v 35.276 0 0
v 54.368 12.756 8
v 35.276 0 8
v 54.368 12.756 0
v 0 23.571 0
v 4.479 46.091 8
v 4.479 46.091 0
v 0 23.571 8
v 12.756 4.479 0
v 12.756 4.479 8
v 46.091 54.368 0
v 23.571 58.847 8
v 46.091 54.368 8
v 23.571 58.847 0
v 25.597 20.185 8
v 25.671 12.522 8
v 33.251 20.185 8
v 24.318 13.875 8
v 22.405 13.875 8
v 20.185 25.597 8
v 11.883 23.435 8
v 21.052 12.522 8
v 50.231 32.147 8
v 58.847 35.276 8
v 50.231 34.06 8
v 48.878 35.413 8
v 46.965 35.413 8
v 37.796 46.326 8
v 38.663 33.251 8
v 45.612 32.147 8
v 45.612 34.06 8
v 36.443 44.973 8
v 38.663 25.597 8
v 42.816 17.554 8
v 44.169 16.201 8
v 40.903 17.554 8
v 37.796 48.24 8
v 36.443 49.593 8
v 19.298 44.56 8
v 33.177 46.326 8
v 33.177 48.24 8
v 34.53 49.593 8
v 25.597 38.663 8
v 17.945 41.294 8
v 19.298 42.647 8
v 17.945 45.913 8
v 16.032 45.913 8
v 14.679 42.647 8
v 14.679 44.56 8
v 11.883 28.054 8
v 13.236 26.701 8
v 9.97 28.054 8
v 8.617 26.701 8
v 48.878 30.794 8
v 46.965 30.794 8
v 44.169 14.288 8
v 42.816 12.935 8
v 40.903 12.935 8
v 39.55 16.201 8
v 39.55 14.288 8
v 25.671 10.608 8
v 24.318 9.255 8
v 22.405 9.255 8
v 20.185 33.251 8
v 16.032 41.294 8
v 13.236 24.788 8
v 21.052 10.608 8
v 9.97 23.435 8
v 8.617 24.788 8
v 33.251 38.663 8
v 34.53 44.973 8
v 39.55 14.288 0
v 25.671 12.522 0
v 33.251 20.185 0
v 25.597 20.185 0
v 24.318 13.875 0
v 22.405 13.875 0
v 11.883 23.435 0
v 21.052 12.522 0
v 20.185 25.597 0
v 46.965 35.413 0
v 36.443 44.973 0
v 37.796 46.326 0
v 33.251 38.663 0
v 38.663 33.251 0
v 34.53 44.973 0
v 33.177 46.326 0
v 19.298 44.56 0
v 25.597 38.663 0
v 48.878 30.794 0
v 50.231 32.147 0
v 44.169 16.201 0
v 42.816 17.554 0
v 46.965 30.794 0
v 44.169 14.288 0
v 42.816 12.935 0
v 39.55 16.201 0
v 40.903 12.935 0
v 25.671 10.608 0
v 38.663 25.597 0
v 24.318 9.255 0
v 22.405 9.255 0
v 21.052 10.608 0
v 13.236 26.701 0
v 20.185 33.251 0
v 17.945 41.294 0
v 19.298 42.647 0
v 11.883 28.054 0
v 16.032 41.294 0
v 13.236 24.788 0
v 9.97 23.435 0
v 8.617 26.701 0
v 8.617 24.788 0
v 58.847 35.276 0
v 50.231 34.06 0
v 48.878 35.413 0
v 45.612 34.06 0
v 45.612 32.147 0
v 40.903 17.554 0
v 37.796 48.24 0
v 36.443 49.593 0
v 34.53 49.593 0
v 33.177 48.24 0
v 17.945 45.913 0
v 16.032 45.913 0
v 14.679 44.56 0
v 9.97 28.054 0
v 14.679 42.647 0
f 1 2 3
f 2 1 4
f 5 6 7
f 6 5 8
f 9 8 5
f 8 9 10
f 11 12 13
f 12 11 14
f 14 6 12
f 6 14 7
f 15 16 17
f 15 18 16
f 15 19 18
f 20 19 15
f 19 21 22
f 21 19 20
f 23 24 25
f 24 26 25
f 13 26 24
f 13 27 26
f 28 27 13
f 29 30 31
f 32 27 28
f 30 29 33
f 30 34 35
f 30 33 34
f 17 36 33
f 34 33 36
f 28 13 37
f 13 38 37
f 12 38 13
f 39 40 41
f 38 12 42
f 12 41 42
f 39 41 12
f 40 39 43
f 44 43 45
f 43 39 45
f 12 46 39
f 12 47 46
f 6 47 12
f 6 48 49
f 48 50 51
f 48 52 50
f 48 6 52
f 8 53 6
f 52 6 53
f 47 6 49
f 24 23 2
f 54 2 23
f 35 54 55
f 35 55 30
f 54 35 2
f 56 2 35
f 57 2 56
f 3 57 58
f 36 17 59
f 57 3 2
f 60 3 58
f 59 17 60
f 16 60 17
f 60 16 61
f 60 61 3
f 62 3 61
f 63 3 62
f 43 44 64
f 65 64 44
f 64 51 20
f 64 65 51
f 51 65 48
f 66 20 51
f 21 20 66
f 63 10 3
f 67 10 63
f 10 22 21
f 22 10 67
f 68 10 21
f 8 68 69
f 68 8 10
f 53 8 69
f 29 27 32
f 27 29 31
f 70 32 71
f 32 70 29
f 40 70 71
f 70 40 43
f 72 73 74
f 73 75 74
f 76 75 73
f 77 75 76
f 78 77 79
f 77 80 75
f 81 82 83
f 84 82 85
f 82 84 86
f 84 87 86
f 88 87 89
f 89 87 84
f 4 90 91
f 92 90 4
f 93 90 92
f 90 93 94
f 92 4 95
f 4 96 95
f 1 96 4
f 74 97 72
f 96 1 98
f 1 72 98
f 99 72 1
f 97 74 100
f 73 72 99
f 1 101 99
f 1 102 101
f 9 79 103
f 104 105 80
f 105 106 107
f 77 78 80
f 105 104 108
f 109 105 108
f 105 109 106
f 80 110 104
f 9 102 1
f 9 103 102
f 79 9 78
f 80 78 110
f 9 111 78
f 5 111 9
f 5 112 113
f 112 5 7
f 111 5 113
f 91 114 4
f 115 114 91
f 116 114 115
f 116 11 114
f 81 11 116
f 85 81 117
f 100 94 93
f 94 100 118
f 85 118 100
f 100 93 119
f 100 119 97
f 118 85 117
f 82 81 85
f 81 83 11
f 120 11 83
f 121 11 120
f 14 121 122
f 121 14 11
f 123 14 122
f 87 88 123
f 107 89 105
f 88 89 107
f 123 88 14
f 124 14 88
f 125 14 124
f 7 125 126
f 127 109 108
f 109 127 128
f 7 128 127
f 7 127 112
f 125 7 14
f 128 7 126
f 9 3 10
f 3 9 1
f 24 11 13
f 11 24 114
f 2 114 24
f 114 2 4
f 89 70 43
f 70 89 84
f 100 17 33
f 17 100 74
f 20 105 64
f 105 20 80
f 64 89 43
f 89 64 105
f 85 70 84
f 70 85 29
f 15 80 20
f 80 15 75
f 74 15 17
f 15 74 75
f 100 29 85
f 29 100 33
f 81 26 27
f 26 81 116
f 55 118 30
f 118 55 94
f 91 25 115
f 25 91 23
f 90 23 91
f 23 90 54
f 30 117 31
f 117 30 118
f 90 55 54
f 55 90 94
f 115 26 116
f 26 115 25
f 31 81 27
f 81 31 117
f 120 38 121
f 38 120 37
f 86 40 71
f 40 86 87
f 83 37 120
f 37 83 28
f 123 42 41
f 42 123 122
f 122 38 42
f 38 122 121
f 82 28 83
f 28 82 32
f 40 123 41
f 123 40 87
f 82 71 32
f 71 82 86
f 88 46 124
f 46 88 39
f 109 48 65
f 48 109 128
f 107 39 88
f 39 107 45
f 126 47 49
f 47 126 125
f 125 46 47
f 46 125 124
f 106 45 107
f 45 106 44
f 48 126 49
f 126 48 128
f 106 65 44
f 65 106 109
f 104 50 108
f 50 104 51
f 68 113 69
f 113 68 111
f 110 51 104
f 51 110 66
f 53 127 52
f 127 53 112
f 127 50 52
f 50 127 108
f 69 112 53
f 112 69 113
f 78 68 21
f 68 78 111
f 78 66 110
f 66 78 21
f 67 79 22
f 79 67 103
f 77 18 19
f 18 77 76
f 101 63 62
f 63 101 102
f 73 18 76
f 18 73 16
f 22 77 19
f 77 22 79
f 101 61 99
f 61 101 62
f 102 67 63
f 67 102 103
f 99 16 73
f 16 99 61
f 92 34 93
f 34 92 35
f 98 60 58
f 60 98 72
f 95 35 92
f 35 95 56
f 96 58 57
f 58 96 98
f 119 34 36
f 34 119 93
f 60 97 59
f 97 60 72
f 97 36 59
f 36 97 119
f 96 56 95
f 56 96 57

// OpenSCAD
$fn = 32;

// ----------------------------------------------------------------------
// Polygon plate: 8-gon R30, 6 bolt windows
// ----------------------------------------------------------------------

// --- parameters (mm) ---
sides = 8;                // number of polygon sides
plate_r = 30;             // circumscribed radius of the polygon
bore_r = 10;              // centre bore radius
bolts = 6;                // number of bolt windows
ring_r = 18.86;           // bolt-circle radius
bolt_r = 2.5;             // bolt window radius
plate_t = 8;              // plate thickness, Z (extrusion height)

plate_d = 2 * plate_r;  // circumscribed diameter
bore_d = 2 * bore_r;  // centre bore diameter
bolt_d = 2 * bolt_r;  // bolt window diameter
ring_d = 2 * ring_r;  // bolt-circle diameter

profile = [[58.847, 35.276], [46.091, 54.368], [23.571, 58.847], [4.479, 46.091], [0, 23.571], [12.756, 4.479], [35.276, 0], [54.368, 12.756]];  // primary outline, 8 points, counter clockwise
void_1 = [[38.663, 33.251], [33.251, 38.663], [25.597, 38.663], [20.185, 33.251], [20.185, 25.597], [25.597, 20.185], [33.251, 20.185], [38.663, 25.597]];  // centre bore, 8 points
void_2 = [[50.231, 34.06], [48.878, 35.413], [46.965, 35.413], [45.612, 34.06], [45.612, 32.147], [46.965, 30.794], [48.878, 30.794], [50.231, 32.147]];  // bolt window 1, 8 points
void_3 = [[37.796, 48.24], [36.443, 49.593], [34.53, 49.593], [33.177, 48.24], [33.177, 46.326], [34.53, 44.973], [36.443, 44.973], [37.796, 46.326]];  // bolt window 2, 8 points
void_4 = [[19.298, 44.56], [17.945, 45.913], [16.032, 45.913], [14.679, 44.56], [14.679, 42.647], [16.032, 41.294], [17.945, 41.294], [19.298, 42.647]];  // bolt window 3, 8 points
void_5 = [[13.236, 26.701], [11.883, 28.054], [9.97, 28.054], [8.617, 26.701], [8.617, 24.788], [9.97, 23.435], [11.883, 23.435], [13.236, 24.788]];  // bolt window 4, 8 points
void_6 = [[25.671, 12.522], [24.318, 13.875], [22.405, 13.875], [21.052, 12.522], [21.052, 10.608], [22.405, 9.255], [24.318, 9.255], [25.671, 10.608]];  // bolt window 5, 8 points
void_7 = [[44.169, 16.201], [42.816, 17.554], [40.903, 17.554], [39.55, 16.201], [39.55, 14.288], [40.903, 12.935], [42.816, 12.935], [44.169, 14.288]];  // bolt window 6, 8 points

// --- the one profile operation ---
difference() {
  linear_extrude(height = plate_t) polygon(points = profile);
  translate([0, 0, -1])
    linear_extrude(height = plate_t + 2) polygon(points = void_1);
  translate([0, 0, -1])
    linear_extrude(height = plate_t + 2) polygon(points = void_2);
  translate([0, 0, -1])
    linear_extrude(height = plate_t + 2) polygon(points = void_3);
  translate([0, 0, -1])
    linear_extrude(height = plate_t + 2) polygon(points = void_4);
  translate([0, 0, -1])
    linear_extrude(height = plate_t + 2) polygon(points = void_5);
  translate([0, 0, -1])
    linear_extrude(height = plate_t + 2) polygon(points = void_6);
  translate([0, 0, -1])
    linear_extrude(height = plate_t + 2) polygon(points = void_7);
}
